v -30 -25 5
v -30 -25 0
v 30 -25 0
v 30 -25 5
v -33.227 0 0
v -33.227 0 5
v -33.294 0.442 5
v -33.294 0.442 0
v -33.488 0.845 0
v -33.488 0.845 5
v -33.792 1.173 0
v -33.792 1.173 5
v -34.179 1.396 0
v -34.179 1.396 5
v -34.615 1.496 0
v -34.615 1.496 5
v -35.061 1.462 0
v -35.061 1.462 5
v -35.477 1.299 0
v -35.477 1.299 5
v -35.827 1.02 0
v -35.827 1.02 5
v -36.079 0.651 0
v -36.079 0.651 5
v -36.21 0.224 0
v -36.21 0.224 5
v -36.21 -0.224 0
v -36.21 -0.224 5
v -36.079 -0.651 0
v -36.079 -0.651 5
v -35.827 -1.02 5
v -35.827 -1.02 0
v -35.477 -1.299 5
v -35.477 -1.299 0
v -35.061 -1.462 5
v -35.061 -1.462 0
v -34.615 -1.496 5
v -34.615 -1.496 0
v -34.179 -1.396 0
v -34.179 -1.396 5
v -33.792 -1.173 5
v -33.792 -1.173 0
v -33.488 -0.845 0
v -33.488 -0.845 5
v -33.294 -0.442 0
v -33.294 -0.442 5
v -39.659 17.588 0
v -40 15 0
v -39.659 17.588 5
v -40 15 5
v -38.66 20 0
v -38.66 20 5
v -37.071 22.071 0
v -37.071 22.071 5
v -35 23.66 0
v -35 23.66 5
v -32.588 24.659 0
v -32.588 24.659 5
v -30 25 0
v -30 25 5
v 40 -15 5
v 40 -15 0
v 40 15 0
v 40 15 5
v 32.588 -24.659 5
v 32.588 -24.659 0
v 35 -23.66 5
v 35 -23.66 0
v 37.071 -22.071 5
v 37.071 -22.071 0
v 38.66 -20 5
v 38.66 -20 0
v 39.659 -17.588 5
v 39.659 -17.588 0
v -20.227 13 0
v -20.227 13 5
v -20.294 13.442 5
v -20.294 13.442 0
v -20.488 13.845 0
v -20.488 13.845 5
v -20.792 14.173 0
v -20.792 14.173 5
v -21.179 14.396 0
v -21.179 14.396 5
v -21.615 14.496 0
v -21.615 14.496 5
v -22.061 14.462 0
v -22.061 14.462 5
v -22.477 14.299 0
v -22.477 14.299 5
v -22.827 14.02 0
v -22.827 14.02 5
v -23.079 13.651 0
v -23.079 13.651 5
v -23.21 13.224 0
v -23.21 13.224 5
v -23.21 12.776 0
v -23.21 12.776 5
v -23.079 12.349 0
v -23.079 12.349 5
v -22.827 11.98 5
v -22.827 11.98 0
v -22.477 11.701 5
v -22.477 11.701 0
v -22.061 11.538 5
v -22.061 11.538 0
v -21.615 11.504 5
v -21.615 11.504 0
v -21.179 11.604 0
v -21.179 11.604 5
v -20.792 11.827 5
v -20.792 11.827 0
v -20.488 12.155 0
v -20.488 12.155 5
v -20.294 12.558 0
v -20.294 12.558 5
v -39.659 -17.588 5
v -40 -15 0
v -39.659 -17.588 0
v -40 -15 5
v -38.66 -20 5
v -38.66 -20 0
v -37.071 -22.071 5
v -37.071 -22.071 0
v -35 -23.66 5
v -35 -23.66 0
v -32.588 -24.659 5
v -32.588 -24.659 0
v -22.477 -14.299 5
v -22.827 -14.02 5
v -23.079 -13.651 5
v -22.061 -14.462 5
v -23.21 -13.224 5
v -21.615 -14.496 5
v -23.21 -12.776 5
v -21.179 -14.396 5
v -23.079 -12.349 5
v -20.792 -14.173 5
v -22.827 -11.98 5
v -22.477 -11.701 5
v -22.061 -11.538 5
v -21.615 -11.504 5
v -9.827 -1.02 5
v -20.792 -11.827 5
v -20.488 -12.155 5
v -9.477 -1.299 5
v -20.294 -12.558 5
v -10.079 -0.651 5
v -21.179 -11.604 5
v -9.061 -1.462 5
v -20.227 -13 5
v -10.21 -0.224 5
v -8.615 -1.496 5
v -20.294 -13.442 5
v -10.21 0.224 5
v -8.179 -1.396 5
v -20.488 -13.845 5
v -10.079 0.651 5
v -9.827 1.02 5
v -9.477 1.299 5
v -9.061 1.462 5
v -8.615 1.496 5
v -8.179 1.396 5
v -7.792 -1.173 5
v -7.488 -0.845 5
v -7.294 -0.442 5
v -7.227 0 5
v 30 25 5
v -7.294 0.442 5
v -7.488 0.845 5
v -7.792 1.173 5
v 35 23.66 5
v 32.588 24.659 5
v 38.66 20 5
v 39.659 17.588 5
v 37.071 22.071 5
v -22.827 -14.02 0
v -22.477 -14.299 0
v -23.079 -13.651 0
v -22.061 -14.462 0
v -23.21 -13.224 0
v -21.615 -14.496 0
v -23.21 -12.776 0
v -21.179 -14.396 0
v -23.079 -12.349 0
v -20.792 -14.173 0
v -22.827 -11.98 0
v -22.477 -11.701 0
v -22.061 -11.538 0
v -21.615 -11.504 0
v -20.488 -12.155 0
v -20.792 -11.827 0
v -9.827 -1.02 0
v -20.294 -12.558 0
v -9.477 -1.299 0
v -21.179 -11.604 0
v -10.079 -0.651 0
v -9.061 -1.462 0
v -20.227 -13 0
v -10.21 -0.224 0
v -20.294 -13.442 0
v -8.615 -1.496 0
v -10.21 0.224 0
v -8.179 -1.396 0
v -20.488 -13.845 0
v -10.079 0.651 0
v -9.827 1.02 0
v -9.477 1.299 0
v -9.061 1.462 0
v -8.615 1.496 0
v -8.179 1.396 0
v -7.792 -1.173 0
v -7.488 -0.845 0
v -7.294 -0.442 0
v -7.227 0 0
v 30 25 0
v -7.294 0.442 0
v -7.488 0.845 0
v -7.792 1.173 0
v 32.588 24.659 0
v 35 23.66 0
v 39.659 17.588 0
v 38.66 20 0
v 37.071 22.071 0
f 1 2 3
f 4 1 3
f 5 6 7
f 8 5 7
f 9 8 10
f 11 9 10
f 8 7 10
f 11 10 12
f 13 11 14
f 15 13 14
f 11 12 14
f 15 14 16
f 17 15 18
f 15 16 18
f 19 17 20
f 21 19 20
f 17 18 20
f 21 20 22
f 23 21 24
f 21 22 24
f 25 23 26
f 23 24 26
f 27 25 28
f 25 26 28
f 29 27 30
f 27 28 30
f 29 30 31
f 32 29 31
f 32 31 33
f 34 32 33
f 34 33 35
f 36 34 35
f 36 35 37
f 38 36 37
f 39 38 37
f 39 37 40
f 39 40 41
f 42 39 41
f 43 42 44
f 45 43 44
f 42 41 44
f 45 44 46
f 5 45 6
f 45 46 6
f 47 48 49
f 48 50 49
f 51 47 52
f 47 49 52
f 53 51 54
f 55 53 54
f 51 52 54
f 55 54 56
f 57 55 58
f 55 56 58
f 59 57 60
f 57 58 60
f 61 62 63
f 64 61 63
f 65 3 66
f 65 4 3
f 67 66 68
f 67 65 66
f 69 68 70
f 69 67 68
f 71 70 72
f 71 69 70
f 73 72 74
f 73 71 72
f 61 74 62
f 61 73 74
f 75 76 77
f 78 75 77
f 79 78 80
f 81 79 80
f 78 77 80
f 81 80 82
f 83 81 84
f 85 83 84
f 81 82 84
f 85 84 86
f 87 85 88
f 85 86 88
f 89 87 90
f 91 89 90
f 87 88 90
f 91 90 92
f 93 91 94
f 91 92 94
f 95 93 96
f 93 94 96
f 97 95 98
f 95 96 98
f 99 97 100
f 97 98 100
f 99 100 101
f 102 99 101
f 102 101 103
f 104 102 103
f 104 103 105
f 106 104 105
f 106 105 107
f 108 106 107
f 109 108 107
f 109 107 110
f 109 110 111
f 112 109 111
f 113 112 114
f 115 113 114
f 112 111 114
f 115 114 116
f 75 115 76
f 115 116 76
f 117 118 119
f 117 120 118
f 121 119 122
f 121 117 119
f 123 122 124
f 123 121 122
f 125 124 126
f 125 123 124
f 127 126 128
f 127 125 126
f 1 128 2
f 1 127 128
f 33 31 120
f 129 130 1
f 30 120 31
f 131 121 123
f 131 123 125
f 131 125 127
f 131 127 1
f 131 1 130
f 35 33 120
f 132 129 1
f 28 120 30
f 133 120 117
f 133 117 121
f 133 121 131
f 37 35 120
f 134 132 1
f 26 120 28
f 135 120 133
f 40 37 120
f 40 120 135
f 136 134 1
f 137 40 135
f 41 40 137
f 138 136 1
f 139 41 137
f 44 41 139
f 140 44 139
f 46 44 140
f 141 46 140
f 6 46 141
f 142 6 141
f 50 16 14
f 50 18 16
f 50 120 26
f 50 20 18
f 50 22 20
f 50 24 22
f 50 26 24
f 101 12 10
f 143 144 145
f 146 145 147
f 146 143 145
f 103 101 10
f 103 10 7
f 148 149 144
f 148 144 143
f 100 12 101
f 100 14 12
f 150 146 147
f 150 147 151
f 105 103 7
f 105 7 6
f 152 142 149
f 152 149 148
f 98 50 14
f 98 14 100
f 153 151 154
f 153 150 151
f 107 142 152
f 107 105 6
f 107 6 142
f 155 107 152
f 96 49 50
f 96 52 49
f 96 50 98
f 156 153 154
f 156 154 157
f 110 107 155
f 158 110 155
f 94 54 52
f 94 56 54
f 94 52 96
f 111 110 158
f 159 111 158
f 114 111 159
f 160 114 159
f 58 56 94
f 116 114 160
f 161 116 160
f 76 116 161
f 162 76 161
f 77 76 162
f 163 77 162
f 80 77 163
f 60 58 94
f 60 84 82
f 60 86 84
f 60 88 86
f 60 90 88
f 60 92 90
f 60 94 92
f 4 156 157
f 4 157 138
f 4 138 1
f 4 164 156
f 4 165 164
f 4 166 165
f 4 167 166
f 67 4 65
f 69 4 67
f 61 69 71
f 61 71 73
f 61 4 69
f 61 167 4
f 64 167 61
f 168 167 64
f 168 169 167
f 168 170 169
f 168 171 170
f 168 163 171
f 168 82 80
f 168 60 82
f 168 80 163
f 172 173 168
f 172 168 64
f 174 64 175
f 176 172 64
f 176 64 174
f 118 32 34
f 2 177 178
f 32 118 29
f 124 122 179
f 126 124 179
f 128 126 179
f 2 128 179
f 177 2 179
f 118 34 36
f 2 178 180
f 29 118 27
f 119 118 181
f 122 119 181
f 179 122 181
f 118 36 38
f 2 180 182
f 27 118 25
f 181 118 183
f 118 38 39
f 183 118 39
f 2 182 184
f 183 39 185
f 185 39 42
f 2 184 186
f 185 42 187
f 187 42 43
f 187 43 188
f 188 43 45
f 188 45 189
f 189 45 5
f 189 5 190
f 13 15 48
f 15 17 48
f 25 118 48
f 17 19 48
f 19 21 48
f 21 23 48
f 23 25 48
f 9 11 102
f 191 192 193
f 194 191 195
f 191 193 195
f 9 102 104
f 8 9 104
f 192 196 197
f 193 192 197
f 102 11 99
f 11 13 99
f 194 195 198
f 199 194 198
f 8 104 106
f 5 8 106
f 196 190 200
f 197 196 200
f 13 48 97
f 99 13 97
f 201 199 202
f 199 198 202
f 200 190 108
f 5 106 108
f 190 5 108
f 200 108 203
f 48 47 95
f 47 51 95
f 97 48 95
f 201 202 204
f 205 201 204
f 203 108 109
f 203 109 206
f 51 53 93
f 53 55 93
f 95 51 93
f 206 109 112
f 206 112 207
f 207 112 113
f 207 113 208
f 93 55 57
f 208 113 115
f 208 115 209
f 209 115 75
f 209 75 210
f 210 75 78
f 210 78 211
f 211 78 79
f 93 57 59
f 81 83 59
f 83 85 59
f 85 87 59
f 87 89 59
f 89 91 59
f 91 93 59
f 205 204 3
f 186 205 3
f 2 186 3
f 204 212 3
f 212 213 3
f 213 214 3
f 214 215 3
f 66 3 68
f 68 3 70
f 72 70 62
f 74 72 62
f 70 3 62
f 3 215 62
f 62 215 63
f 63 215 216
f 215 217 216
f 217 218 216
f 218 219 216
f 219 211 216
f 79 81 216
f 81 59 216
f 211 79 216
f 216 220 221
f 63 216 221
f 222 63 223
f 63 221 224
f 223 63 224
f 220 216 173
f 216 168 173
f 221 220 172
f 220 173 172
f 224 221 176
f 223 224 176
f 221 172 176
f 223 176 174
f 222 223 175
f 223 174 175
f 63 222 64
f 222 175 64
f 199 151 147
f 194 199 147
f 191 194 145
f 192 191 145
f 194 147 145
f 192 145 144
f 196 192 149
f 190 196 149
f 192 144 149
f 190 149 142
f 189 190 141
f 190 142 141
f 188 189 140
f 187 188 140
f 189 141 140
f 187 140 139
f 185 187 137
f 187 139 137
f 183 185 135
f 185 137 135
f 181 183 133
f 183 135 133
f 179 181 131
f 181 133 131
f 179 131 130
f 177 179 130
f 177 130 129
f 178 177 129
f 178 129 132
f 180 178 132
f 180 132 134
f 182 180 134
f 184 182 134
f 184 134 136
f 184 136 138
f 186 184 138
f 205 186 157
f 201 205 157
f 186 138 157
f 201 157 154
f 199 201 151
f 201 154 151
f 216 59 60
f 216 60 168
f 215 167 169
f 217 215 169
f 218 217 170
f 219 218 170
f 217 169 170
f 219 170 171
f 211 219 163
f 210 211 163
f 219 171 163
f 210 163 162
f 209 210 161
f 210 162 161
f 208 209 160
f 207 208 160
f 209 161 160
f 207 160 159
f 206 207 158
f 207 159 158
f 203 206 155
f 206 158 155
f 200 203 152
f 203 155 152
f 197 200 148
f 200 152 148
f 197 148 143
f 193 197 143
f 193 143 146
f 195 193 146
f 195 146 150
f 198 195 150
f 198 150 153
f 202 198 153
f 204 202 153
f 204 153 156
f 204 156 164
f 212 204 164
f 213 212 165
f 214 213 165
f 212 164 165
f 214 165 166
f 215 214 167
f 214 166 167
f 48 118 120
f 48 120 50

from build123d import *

# Parameters (mm, degrees)
SKETCH1_W           = 80
SKETCH1_H           = 50
BOSS_EXTRUDE1_DEPTH = 5
SKETCH2_R           = 1.5
CUT_EXTRUDE1_DEPTH  = 5
FILLET2_R           = 10


with BuildPart() as part:
    # Sketch1 → Boss-Extrude1 (new body)
    with BuildSketch(Plane.XY):
        Rectangle(SKETCH1_W, SKETCH1_H)
    extrude(amount=BOSS_EXTRUDE1_DEPTH)

    # Sketch2 → Cut-Extrude1 (cut)
    with BuildSketch(Plane.XY.offset(5)):
        with Locations((-21.727182294, 13)):
            Circle(SKETCH2_R)
        with Locations((-8.727182294, 0)):
            Circle(SKETCH2_R)
        with Locations((-21.727182294, -13)):
            Circle(SKETCH2_R)
        with Locations((-34.727182294, 0)):
            Circle(SKETCH2_R)
    extrude(amount=-CUT_EXTRUDE1_DEPTH, mode=Mode.SUBTRACT)

    # Fillet2
    fillet2_edges = [part.edges().sort_by_distance(p)[0] for p in [
        (40, -25, 2.5),
        (-40, -25, 2.5),
        (-40, 25, 2.5),
        (40, 25, 2.5),
    ]]
    fillet(fillet2_edges, radius=FILLET2_R)


solid = part.part
